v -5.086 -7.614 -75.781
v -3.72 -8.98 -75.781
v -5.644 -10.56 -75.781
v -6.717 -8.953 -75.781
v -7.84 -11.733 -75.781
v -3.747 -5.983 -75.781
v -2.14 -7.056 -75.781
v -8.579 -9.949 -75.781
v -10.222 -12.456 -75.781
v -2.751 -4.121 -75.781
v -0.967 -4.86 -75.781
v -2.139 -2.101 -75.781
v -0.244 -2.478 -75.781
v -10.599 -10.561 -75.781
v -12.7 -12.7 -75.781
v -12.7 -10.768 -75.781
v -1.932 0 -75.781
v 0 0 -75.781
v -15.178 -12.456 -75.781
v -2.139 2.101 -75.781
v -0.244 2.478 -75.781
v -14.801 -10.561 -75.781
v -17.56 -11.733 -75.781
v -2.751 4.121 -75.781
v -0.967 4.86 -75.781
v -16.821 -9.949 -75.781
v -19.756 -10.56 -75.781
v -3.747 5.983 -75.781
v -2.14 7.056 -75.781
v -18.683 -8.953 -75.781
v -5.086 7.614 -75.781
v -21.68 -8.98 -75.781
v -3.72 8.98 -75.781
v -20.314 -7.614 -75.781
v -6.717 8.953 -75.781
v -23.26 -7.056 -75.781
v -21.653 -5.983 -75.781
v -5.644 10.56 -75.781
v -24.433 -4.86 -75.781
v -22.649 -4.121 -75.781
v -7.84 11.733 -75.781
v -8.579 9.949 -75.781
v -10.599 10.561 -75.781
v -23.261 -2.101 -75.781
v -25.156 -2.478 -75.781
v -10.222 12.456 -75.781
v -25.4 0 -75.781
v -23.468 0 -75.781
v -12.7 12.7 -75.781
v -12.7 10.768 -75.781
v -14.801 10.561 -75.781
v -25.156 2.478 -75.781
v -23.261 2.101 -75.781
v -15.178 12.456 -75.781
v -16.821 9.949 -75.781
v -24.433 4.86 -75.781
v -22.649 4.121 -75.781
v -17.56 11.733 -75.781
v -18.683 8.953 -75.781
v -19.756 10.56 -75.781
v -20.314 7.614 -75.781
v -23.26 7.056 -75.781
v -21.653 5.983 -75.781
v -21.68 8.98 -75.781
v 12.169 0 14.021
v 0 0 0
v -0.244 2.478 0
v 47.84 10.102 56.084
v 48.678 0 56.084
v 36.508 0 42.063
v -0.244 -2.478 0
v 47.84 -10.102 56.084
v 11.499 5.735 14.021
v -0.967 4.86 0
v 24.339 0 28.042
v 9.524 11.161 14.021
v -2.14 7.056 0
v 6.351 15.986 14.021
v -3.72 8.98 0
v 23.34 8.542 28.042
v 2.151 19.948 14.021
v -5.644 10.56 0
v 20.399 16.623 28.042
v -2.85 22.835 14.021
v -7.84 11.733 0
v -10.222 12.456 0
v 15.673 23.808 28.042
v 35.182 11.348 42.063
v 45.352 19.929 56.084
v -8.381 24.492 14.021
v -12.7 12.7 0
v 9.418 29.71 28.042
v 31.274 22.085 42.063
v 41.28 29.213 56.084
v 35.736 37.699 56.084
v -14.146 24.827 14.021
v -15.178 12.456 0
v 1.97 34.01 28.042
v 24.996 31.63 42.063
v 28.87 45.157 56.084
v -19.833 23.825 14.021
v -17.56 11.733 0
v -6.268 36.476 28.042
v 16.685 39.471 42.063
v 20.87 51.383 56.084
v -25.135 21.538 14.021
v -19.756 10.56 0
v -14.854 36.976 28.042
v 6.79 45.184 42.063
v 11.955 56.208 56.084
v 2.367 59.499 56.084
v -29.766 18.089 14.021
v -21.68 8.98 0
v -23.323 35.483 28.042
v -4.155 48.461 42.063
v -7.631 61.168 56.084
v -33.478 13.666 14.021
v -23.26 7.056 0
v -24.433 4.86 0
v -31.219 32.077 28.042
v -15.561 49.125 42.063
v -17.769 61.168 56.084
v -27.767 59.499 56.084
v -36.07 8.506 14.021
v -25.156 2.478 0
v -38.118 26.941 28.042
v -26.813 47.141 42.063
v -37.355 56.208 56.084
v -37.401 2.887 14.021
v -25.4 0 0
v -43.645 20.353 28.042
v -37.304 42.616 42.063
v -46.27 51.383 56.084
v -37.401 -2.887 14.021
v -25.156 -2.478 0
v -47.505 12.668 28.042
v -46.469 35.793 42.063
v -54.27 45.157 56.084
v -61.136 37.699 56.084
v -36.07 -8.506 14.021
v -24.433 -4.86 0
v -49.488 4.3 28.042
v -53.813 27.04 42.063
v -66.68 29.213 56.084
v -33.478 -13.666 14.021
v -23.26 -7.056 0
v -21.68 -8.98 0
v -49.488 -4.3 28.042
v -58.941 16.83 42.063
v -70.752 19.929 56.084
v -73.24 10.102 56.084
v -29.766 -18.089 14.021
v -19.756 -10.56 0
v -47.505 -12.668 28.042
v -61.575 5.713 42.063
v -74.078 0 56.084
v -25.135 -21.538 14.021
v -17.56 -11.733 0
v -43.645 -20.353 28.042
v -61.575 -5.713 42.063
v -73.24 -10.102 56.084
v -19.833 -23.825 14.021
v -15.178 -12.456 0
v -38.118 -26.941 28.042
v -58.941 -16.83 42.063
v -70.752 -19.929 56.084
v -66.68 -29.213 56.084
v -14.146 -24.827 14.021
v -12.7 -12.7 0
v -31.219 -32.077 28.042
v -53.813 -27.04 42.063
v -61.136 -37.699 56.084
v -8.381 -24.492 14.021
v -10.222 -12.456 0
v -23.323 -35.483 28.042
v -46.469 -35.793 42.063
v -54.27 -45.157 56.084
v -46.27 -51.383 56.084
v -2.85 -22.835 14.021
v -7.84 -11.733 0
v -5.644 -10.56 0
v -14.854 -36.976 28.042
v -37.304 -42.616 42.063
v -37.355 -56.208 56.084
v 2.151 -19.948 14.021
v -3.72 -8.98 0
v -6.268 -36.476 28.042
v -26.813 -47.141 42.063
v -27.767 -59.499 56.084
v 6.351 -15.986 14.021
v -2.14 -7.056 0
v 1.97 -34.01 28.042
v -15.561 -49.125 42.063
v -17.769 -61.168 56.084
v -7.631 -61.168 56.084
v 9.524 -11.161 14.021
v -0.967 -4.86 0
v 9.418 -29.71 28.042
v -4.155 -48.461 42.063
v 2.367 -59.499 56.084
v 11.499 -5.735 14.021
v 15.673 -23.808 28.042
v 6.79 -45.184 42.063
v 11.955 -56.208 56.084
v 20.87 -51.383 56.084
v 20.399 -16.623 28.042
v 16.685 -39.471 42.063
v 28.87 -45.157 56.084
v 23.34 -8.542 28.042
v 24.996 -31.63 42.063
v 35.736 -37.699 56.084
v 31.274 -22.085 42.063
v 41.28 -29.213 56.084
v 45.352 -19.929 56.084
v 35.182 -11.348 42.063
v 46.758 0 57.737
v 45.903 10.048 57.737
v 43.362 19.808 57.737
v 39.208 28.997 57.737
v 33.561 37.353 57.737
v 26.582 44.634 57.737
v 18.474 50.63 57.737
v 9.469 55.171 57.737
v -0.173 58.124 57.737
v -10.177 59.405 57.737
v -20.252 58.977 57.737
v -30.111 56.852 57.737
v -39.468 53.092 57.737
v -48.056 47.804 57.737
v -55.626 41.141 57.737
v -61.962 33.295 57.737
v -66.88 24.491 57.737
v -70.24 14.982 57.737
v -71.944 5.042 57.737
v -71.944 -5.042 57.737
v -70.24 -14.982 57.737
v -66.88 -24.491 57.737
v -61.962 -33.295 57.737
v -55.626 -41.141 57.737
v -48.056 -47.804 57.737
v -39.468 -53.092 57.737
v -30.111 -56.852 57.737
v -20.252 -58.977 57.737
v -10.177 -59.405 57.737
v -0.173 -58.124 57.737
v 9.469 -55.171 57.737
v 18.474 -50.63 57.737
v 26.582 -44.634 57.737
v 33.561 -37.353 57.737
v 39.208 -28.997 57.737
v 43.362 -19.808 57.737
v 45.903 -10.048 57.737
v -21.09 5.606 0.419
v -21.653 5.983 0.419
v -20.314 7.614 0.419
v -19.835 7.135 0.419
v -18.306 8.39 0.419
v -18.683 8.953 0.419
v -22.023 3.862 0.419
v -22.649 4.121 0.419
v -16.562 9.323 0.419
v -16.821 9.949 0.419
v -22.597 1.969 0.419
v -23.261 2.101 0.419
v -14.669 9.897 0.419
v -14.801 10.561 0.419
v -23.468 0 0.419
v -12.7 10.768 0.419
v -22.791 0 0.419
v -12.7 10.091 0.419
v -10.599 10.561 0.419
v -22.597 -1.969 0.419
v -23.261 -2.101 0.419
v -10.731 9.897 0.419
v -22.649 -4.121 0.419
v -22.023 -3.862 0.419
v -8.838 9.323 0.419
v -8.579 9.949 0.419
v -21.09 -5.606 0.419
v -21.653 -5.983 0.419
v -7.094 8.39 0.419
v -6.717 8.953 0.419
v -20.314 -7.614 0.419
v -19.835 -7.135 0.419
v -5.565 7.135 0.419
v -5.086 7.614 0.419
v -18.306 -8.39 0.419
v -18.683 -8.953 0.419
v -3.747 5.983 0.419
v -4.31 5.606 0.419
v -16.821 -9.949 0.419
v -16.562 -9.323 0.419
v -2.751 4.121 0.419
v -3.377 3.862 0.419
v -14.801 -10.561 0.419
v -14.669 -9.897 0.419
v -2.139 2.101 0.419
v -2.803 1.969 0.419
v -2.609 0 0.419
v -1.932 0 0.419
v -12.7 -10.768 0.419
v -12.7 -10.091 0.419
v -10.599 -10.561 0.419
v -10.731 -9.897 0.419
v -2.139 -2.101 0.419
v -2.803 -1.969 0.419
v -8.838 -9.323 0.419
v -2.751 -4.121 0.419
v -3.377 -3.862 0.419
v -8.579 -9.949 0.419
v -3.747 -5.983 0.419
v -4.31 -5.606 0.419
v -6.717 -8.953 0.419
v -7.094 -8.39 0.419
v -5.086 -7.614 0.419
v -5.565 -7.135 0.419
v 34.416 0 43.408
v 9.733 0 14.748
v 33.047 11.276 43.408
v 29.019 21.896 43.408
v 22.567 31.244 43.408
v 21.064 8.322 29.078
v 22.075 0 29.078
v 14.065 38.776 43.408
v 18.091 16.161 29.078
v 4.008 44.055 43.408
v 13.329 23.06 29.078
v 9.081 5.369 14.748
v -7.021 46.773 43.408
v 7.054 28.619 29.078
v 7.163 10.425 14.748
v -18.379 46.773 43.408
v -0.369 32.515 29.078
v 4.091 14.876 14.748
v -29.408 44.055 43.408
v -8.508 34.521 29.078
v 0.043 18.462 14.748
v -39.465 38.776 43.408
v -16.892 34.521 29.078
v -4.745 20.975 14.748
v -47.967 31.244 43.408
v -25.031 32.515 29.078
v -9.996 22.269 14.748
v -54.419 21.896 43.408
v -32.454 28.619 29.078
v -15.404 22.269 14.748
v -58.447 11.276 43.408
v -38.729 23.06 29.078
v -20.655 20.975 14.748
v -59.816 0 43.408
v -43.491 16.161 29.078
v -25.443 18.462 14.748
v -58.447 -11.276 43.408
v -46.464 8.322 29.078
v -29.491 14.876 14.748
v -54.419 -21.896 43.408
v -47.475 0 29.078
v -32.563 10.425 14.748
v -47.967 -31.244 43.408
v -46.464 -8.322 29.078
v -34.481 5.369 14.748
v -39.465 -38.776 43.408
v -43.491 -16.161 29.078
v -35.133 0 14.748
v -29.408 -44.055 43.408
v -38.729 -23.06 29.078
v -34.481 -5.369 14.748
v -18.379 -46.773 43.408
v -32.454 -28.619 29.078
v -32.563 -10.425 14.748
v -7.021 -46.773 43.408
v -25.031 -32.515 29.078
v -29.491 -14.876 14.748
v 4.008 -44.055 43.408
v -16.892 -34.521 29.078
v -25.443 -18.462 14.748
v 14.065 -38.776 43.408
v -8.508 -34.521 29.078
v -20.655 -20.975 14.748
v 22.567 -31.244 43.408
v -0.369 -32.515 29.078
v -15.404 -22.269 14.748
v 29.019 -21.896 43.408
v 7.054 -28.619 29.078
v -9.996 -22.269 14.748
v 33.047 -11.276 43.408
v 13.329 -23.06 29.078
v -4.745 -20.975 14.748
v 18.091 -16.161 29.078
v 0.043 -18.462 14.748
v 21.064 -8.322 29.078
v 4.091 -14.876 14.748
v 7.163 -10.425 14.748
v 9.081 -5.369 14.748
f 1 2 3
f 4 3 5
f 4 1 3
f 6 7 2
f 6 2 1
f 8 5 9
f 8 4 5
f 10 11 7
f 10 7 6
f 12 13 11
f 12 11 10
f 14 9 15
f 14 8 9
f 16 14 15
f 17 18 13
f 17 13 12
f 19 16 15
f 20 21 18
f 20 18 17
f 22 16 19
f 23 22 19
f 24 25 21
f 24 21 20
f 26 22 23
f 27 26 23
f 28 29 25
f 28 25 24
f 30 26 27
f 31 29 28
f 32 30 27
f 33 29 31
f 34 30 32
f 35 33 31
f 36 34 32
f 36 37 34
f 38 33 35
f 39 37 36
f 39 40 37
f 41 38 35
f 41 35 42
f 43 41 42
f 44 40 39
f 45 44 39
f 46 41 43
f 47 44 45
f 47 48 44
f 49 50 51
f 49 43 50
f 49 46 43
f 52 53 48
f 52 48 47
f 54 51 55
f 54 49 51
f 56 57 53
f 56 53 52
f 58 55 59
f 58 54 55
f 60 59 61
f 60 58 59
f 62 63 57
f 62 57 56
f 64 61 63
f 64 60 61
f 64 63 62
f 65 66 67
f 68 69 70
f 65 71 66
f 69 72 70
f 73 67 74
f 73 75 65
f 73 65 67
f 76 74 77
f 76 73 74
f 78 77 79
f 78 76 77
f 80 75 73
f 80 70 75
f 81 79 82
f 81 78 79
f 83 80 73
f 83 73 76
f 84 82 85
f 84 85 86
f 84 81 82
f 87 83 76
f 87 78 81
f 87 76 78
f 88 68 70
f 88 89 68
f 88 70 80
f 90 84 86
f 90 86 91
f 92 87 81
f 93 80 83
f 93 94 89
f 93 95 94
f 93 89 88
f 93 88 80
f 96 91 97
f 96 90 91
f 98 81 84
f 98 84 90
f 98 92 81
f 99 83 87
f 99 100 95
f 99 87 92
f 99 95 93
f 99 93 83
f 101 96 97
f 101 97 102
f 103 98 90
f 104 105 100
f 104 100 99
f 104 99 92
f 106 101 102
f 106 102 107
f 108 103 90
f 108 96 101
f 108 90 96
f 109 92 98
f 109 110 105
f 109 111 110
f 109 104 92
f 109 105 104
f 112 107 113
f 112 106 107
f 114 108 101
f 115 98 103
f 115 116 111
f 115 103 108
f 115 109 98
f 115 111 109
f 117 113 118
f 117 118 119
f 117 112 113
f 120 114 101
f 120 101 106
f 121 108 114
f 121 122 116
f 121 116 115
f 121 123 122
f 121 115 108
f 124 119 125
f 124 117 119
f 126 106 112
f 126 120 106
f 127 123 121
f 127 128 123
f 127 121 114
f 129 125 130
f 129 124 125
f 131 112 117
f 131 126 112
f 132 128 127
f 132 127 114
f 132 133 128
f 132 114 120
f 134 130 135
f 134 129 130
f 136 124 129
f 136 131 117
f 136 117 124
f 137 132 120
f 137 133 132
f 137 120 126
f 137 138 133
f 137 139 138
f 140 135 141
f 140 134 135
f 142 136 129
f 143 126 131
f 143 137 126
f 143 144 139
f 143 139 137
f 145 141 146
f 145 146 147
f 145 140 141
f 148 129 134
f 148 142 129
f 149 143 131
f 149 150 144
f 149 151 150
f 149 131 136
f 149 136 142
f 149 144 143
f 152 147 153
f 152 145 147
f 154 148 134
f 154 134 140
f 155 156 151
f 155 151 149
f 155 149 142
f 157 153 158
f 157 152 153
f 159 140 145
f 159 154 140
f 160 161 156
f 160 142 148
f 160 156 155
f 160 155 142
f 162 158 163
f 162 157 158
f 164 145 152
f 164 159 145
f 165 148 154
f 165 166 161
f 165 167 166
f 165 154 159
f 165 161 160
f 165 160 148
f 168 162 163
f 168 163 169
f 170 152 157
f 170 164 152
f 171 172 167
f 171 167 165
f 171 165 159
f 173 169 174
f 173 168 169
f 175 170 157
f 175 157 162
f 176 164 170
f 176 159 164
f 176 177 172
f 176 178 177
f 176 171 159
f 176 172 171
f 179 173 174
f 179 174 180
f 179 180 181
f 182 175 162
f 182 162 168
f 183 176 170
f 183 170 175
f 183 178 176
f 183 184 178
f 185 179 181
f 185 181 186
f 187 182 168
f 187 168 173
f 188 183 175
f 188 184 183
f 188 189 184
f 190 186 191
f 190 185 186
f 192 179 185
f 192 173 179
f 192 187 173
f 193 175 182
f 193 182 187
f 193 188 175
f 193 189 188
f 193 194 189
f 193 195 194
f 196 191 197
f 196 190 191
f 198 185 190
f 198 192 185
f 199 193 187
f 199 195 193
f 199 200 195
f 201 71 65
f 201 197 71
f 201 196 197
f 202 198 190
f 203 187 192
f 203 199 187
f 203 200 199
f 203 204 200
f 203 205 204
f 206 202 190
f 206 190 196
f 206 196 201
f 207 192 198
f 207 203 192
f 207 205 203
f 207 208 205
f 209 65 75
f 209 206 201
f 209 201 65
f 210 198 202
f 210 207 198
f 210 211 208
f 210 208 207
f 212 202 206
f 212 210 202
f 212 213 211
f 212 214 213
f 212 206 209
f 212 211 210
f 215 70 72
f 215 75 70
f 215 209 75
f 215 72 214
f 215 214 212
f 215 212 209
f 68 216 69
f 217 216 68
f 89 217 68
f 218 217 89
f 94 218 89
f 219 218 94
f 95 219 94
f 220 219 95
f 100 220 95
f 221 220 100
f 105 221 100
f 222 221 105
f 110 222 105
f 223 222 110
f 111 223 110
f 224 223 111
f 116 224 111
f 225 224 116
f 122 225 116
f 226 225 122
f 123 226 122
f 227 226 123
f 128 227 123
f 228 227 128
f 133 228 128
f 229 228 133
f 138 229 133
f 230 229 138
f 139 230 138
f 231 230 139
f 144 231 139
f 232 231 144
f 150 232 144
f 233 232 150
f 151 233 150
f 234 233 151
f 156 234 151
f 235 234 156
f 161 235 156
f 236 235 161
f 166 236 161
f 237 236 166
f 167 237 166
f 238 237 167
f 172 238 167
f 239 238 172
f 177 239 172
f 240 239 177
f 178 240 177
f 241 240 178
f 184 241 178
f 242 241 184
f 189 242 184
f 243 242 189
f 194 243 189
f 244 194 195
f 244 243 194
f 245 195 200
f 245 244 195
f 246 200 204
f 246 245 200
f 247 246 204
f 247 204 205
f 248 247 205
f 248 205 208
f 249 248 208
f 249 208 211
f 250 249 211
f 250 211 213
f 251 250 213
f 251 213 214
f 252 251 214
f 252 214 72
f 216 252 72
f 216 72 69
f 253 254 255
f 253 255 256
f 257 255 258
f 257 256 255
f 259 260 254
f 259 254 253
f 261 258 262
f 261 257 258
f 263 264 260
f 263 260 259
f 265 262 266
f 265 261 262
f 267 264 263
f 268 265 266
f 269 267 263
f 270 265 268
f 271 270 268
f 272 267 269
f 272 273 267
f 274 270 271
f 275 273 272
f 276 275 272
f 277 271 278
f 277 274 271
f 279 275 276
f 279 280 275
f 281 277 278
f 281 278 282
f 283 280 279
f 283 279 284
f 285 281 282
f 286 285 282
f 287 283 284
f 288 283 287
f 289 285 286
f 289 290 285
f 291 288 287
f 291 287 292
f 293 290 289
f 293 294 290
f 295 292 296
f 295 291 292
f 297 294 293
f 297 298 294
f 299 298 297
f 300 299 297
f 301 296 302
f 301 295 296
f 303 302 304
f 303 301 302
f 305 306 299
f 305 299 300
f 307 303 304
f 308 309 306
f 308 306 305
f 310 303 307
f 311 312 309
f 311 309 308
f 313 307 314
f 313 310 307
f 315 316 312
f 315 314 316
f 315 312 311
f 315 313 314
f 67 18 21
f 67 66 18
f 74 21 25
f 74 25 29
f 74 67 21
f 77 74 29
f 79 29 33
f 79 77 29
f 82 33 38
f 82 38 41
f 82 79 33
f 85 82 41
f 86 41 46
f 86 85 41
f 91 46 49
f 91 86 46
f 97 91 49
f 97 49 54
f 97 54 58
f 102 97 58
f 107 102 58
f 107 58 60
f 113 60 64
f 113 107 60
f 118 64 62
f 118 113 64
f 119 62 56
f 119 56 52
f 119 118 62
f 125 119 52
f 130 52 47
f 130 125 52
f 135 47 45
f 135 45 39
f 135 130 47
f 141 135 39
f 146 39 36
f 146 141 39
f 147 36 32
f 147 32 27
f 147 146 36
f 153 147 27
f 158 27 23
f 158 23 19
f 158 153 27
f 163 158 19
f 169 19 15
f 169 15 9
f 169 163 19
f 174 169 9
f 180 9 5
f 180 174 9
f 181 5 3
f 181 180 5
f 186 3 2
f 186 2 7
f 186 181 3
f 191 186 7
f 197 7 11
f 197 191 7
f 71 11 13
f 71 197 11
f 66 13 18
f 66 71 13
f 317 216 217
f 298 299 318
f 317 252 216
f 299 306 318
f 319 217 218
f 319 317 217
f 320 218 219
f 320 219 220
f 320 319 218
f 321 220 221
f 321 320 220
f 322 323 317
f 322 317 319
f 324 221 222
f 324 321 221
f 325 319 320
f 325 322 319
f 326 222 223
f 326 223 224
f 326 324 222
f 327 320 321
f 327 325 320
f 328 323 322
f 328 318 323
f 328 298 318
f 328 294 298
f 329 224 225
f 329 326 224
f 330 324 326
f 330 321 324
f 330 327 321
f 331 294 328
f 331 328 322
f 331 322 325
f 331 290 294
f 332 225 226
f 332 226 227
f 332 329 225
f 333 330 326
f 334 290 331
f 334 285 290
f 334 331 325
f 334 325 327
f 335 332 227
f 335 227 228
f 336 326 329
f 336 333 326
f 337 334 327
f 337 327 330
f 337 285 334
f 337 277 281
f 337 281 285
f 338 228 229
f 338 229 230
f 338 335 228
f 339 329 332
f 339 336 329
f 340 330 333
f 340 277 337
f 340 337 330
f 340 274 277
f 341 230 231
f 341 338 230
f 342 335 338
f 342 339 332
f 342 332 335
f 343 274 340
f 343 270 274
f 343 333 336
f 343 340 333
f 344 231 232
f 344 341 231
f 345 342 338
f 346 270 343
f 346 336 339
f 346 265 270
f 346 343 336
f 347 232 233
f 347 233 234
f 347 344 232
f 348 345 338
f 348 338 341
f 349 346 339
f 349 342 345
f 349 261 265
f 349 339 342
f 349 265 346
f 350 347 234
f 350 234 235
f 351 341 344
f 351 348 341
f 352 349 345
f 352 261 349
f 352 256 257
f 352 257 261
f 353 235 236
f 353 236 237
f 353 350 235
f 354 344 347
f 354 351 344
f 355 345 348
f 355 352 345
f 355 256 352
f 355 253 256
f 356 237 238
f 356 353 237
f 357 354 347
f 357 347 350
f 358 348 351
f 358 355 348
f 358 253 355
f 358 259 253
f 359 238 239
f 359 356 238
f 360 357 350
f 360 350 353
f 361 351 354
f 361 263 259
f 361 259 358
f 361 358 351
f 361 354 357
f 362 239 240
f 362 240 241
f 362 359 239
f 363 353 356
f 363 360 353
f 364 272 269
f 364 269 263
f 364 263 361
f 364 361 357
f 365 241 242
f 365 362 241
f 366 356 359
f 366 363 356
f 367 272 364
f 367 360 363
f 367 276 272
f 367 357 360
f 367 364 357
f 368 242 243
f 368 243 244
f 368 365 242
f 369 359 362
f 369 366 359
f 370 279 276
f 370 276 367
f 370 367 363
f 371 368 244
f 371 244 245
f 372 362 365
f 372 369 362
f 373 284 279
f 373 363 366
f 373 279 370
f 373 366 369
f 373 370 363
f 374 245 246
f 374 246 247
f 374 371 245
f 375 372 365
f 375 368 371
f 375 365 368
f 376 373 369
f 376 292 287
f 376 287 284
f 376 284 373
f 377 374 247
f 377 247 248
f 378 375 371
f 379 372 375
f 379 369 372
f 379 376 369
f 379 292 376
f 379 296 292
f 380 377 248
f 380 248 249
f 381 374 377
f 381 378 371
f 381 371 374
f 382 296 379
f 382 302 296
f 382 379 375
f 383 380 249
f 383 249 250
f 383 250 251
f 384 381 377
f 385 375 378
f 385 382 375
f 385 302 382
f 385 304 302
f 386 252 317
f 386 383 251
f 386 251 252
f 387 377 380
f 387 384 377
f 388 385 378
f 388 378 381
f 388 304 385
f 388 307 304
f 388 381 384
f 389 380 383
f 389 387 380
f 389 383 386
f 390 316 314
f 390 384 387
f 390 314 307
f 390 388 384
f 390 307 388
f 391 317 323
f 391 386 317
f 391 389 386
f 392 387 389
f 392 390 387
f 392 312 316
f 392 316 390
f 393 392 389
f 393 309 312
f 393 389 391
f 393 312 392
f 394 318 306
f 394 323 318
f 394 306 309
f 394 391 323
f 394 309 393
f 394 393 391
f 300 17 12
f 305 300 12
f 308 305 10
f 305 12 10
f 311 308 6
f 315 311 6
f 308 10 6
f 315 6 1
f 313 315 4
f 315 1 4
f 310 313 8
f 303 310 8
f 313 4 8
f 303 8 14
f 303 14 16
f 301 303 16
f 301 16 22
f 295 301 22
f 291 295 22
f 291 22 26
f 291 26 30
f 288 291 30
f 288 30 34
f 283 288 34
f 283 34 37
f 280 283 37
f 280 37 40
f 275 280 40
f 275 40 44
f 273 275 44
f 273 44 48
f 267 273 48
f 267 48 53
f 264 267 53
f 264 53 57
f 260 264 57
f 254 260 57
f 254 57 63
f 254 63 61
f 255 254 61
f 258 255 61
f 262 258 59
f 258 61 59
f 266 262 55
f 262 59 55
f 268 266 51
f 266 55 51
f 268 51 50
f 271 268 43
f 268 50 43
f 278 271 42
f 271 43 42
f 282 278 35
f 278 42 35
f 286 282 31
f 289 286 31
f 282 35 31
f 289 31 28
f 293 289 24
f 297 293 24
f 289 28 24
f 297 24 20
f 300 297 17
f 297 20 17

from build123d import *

# Parameters (mm, degrees)
F2_R     = 10.7682779898
F3_DEPTH = 25.4
F4_DEPTH = 25.4
F5_DEPTH = 25.4


with BuildPart() as f1:
    # F0 (on Front) → F1 (revolve)
    with BuildSketch(Plane.XZ):
        Polygon((0, -75.7813751698), (0, 0), (48.6775934706, 56.0841891061), (46.7580937851, 57.7373997368), (-2.9694908299, 0), (-12.7, 0), (-12.7, -75.7813751698), align=None)
    revolve(axis=Axis((-12.7, 0, -37.8906875849), (0, 0, 1)))

    # F2 (on face) → F3 (cut)
    with BuildSketch(Plane(origin=(0, 0, -75.7813751698), x_dir=(1, 0, 0), z_dir=(0, 0, -1))):
        with Locations((-12.7, 0)):
            Circle(F2_R)
    extrude(amount=-F3_DEPTH, mode=Mode.SUBTRACT)

    # F4 (cut): a face of the model
    f4_faces = [f1.faces().sort_by_distance(p)[0] for p in [
        (-12.7, 0, -50.3813751698),
    ]]
    extrude(f4_faces, amount=-F4_DEPTH, mode=Mode.SUBTRACT)

    # F5 (cut): a face of the model
    f5_faces = [f1.faces().sort_by_distance(p)[0] for p in [
        (-12.7, 0, -24.9813751698),
    ]]
    extrude(f5_faces, amount=-F5_DEPTH, mode=Mode.SUBTRACT)


solid = f1.part
